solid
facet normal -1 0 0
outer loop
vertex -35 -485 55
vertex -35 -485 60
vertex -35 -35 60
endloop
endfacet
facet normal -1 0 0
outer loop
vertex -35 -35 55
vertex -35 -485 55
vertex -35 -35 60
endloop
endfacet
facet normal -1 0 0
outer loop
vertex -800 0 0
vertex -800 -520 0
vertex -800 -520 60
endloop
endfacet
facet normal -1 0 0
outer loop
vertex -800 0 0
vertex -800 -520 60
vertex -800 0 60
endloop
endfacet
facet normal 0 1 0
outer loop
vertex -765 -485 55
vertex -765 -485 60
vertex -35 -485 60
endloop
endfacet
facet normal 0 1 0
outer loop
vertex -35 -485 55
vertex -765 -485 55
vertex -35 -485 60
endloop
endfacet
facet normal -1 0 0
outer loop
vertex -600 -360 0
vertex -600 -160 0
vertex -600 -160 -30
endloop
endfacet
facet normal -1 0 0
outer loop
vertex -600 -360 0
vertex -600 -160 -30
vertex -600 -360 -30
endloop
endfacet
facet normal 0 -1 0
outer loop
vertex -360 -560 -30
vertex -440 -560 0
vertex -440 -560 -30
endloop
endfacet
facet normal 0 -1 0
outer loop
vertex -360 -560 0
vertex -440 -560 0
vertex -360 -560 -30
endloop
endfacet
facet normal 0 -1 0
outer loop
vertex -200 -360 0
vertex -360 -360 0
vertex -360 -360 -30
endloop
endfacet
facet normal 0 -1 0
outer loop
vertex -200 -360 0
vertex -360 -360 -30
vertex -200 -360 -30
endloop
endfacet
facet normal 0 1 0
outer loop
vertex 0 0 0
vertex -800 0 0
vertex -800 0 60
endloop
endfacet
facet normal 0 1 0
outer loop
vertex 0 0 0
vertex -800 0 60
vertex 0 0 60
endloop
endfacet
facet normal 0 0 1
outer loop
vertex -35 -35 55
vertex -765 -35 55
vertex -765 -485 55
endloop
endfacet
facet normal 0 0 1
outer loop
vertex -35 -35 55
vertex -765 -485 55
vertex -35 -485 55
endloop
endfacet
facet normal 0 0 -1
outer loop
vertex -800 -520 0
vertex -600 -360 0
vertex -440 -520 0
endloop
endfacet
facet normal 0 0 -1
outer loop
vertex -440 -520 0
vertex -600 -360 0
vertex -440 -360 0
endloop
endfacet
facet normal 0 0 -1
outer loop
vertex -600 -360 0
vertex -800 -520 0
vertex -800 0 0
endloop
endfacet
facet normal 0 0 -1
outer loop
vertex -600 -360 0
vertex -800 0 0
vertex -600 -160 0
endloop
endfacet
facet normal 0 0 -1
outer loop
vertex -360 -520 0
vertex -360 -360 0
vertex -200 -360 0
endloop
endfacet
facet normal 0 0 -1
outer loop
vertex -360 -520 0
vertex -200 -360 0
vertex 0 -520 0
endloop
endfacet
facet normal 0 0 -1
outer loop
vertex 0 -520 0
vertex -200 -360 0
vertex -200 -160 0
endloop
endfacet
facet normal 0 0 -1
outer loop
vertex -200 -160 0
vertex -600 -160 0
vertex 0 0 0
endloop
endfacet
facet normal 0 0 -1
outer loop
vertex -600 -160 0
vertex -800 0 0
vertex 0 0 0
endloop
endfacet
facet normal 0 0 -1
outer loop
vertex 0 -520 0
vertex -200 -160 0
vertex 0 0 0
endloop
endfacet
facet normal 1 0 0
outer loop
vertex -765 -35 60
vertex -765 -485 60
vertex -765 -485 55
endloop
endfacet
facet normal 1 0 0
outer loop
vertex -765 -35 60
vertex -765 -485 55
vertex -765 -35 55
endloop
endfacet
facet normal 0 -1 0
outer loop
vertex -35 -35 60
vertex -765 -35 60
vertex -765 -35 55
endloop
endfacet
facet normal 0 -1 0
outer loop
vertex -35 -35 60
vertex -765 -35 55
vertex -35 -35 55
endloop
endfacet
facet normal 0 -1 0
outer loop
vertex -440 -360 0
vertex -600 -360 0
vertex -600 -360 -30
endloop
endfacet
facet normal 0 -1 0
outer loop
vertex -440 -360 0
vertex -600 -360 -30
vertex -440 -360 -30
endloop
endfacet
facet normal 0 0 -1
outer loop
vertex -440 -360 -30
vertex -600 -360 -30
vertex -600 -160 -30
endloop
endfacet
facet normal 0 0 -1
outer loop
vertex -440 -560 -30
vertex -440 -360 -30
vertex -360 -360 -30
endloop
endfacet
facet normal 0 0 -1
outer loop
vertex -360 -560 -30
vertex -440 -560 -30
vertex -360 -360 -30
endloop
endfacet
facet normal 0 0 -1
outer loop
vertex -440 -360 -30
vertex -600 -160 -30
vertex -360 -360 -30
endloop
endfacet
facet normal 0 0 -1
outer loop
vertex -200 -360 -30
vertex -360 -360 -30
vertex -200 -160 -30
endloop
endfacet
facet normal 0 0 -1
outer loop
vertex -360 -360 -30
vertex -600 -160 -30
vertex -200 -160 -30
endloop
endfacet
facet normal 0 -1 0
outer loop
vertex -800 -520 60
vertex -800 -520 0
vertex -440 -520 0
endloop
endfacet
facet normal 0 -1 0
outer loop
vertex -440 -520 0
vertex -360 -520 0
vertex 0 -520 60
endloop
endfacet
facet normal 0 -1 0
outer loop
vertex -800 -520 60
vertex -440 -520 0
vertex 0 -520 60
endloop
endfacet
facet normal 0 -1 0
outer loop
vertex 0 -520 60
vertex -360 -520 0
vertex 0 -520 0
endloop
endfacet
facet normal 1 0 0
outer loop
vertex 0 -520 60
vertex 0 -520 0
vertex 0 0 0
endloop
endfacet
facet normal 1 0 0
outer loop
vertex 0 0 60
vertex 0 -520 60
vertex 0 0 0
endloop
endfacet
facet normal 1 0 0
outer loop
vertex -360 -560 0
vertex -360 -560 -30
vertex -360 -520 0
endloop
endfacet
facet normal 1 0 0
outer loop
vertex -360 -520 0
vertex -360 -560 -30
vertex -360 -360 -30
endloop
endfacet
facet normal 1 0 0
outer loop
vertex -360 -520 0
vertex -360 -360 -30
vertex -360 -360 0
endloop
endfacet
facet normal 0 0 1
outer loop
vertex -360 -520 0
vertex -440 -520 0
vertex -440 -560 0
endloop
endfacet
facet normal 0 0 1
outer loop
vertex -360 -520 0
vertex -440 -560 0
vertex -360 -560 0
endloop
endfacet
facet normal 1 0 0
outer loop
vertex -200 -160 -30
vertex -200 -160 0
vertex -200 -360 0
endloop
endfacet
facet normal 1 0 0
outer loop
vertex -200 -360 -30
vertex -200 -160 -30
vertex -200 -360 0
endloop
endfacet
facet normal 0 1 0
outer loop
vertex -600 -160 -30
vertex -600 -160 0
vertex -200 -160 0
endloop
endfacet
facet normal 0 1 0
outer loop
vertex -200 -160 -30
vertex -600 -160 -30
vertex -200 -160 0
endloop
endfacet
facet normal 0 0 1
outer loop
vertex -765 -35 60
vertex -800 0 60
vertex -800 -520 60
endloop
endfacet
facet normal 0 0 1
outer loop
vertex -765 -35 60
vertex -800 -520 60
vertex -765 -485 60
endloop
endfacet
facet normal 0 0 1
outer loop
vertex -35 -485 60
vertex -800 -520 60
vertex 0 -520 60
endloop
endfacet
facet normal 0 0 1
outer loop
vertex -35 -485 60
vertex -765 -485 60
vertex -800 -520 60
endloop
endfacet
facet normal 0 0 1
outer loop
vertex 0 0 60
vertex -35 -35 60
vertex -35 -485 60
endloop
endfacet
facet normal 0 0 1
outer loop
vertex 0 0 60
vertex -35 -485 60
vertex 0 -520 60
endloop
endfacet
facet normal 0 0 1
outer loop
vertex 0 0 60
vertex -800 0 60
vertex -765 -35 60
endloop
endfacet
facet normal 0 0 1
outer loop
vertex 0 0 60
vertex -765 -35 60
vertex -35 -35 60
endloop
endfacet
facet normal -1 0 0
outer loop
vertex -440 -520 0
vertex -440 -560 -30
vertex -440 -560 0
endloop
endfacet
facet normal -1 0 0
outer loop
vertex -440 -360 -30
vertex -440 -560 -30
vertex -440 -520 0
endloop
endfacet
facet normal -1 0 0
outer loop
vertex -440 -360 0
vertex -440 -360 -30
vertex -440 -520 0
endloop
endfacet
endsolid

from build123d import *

# Parameters (mm, degrees)
F0_W     = 800
F0_H     = 520
F1_DEPTH = 60
F2_W     = 400
F2_H     = 200
F3_DEPTH = 30
F4_W     = 80
F4_H     = 30
F5_DEPTH = 200
F6_W     = 730
F6_H     = 450
F7_DEPTH = 5


with BuildPart() as f1:
    # F0 (on Top) → F1 (new body)
    with BuildSketch(Plane.XY):
        with Locations((-400, -260)):
            Rectangle(F0_W, F0_H)
    extrude(amount=F1_DEPTH)

    # F2 (on face) → F3 (join)
    with BuildSketch(Plane(origin=(0, 0, 0), x_dir=(1, 0, 0), z_dir=(0, 0, -1))):
        with Locations((-400, 260)):
            Rectangle(F2_W, F2_H)
    extrude(amount=F3_DEPTH)

    # F4 (on face) → F5 (join)
    with BuildSketch(Plane.XZ.offset(360)):
        with Locations((-400, -15)):
            Rectangle(F4_W, F4_H)
    extrude(amount=F5_DEPTH)

    # F6 (on face) → F7 (cut)
    with BuildSketch(Plane.XY.offset(60)):
        with Locations((-400, -260)):
            Rectangle(F6_W, F6_H)
    extrude(amount=-F7_DEPTH, mode=Mode.SUBTRACT)


solid = f1.part
